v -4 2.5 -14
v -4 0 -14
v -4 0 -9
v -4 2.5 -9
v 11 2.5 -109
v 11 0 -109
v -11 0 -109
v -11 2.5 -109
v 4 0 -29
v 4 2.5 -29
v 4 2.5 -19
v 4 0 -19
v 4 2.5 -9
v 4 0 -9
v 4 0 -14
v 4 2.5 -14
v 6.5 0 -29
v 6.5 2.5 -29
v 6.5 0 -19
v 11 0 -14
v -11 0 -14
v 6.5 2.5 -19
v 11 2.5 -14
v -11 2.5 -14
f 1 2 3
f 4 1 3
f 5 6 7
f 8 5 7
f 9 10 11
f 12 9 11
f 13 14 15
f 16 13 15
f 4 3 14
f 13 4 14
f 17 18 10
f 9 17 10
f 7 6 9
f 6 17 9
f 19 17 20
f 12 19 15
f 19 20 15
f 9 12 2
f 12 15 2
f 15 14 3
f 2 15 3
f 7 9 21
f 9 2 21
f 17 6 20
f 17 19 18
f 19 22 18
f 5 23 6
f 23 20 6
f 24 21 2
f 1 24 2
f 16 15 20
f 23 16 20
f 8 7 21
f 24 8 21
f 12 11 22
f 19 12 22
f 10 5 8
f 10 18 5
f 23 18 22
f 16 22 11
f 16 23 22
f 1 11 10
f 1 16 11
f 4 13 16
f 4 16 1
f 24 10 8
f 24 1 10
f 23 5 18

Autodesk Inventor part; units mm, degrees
ref_plane "YZ Plane" through (0, 0, 0) normal (1, 0, 0) x (0, 1, 0)
ref_plane "XZ Plane" through (0, 0, 0) normal (0, 1, 0) x (-1, 0, 0)
ref_plane "XY Plane" through (0, 0, 0) normal (0, 0, 1) x (1, 0, 0)
sketch "スケッチ1" plane through (0, 0, 0) normal (0, 1, 0) x (-1, 0, 0)
  line L0 (11, 11) -> (-11, 11)
  line L1 (-11, 11) -> (-11, -9.8801)
  line L2 (11, -9) -> (11, 11)
  line L3 (-11, -5.4423) -> (-11, -109)
  line L4 (-11, -109) -> (11, -109)
  line L5 (11, -109) -> (11, -9)
  circle A0 centre (0, 0) radius 11
  point P0 (11, 1)
  dimension "d1" = 20
  dimension "d12" = 22
  dimension "d13" = 120
extrude "押し出し1" add sketch "スケッチ1" along normal blind 2.5
sketch "スケッチ2" plane through (0, 0, 0) normal (0, -1, 0) x (1, 0, 0)
  line L0 (11, 11) -> (-11, 11)
  line L1 (-11, 11) -> (-11, -14)
  line L2 (-11, -14) -> (11, -14)
  line L3 (11, -14) -> (11, 11)
  line L4 (4, -14) -> (-4, -14)
  line L5 (-4, -14) -> (-4, -9)
  line L6 (-4, -9) -> (4, -9)
  line L7 (4, -9) -> (4, -14)
  point P0 (0, 0)
  point P1 (0, -14)
  dimension "d14" = 25
  dimension "d15" = 8
  dimension "d16" = 5
extrude "押し出し2" cut sketch "スケッチ2" against normal through all contours L3 L2 L7 L6 L5 L1 L0
sketch "スケッチ3" plane through (0, 2.5, 0) normal (0, 1, 0) x (1, 0, 0)
  line L0 (4, 19) -> (6.5, 19)
  line L1 (6.5, 19) -> (6.5, 29)
  line L2 (6.5, 29) -> (4, 29)
  line L3 (4, 29) -> (4, 19)
  line L4 (4, 14) -> (11, 14) projected
  line L5 (4, 9) -> (4, 14) projected
  point P0 (0, 0)
  dimension "d19" = 2.5
  dimension "d20" = 10
  dimension "d21" = 5
extrude "押し出し3" cut sketch "スケッチ3" against normal through all
equation "\"BendRadius\" = Thickness"
equation "\"BendReliefWidth\" = Thickness"
equation "\"BendReliefDepth\" = 0.5 * Thickness"
equation "\"CornerReliefSize\" = 4 * Thickness"
equation "\"MinimumRemnant\" = 2 * Thickness"
equation "\"TransitionRadius\" = BendRadius"
equation "\"JacobiRadiusSize\" = BendRadius"
equation "\"GapSize\" = Thickness"
equation "\"Thickness\" = 3.048"
properties part number "dish_upper" material "木材 (カエデ材)"
